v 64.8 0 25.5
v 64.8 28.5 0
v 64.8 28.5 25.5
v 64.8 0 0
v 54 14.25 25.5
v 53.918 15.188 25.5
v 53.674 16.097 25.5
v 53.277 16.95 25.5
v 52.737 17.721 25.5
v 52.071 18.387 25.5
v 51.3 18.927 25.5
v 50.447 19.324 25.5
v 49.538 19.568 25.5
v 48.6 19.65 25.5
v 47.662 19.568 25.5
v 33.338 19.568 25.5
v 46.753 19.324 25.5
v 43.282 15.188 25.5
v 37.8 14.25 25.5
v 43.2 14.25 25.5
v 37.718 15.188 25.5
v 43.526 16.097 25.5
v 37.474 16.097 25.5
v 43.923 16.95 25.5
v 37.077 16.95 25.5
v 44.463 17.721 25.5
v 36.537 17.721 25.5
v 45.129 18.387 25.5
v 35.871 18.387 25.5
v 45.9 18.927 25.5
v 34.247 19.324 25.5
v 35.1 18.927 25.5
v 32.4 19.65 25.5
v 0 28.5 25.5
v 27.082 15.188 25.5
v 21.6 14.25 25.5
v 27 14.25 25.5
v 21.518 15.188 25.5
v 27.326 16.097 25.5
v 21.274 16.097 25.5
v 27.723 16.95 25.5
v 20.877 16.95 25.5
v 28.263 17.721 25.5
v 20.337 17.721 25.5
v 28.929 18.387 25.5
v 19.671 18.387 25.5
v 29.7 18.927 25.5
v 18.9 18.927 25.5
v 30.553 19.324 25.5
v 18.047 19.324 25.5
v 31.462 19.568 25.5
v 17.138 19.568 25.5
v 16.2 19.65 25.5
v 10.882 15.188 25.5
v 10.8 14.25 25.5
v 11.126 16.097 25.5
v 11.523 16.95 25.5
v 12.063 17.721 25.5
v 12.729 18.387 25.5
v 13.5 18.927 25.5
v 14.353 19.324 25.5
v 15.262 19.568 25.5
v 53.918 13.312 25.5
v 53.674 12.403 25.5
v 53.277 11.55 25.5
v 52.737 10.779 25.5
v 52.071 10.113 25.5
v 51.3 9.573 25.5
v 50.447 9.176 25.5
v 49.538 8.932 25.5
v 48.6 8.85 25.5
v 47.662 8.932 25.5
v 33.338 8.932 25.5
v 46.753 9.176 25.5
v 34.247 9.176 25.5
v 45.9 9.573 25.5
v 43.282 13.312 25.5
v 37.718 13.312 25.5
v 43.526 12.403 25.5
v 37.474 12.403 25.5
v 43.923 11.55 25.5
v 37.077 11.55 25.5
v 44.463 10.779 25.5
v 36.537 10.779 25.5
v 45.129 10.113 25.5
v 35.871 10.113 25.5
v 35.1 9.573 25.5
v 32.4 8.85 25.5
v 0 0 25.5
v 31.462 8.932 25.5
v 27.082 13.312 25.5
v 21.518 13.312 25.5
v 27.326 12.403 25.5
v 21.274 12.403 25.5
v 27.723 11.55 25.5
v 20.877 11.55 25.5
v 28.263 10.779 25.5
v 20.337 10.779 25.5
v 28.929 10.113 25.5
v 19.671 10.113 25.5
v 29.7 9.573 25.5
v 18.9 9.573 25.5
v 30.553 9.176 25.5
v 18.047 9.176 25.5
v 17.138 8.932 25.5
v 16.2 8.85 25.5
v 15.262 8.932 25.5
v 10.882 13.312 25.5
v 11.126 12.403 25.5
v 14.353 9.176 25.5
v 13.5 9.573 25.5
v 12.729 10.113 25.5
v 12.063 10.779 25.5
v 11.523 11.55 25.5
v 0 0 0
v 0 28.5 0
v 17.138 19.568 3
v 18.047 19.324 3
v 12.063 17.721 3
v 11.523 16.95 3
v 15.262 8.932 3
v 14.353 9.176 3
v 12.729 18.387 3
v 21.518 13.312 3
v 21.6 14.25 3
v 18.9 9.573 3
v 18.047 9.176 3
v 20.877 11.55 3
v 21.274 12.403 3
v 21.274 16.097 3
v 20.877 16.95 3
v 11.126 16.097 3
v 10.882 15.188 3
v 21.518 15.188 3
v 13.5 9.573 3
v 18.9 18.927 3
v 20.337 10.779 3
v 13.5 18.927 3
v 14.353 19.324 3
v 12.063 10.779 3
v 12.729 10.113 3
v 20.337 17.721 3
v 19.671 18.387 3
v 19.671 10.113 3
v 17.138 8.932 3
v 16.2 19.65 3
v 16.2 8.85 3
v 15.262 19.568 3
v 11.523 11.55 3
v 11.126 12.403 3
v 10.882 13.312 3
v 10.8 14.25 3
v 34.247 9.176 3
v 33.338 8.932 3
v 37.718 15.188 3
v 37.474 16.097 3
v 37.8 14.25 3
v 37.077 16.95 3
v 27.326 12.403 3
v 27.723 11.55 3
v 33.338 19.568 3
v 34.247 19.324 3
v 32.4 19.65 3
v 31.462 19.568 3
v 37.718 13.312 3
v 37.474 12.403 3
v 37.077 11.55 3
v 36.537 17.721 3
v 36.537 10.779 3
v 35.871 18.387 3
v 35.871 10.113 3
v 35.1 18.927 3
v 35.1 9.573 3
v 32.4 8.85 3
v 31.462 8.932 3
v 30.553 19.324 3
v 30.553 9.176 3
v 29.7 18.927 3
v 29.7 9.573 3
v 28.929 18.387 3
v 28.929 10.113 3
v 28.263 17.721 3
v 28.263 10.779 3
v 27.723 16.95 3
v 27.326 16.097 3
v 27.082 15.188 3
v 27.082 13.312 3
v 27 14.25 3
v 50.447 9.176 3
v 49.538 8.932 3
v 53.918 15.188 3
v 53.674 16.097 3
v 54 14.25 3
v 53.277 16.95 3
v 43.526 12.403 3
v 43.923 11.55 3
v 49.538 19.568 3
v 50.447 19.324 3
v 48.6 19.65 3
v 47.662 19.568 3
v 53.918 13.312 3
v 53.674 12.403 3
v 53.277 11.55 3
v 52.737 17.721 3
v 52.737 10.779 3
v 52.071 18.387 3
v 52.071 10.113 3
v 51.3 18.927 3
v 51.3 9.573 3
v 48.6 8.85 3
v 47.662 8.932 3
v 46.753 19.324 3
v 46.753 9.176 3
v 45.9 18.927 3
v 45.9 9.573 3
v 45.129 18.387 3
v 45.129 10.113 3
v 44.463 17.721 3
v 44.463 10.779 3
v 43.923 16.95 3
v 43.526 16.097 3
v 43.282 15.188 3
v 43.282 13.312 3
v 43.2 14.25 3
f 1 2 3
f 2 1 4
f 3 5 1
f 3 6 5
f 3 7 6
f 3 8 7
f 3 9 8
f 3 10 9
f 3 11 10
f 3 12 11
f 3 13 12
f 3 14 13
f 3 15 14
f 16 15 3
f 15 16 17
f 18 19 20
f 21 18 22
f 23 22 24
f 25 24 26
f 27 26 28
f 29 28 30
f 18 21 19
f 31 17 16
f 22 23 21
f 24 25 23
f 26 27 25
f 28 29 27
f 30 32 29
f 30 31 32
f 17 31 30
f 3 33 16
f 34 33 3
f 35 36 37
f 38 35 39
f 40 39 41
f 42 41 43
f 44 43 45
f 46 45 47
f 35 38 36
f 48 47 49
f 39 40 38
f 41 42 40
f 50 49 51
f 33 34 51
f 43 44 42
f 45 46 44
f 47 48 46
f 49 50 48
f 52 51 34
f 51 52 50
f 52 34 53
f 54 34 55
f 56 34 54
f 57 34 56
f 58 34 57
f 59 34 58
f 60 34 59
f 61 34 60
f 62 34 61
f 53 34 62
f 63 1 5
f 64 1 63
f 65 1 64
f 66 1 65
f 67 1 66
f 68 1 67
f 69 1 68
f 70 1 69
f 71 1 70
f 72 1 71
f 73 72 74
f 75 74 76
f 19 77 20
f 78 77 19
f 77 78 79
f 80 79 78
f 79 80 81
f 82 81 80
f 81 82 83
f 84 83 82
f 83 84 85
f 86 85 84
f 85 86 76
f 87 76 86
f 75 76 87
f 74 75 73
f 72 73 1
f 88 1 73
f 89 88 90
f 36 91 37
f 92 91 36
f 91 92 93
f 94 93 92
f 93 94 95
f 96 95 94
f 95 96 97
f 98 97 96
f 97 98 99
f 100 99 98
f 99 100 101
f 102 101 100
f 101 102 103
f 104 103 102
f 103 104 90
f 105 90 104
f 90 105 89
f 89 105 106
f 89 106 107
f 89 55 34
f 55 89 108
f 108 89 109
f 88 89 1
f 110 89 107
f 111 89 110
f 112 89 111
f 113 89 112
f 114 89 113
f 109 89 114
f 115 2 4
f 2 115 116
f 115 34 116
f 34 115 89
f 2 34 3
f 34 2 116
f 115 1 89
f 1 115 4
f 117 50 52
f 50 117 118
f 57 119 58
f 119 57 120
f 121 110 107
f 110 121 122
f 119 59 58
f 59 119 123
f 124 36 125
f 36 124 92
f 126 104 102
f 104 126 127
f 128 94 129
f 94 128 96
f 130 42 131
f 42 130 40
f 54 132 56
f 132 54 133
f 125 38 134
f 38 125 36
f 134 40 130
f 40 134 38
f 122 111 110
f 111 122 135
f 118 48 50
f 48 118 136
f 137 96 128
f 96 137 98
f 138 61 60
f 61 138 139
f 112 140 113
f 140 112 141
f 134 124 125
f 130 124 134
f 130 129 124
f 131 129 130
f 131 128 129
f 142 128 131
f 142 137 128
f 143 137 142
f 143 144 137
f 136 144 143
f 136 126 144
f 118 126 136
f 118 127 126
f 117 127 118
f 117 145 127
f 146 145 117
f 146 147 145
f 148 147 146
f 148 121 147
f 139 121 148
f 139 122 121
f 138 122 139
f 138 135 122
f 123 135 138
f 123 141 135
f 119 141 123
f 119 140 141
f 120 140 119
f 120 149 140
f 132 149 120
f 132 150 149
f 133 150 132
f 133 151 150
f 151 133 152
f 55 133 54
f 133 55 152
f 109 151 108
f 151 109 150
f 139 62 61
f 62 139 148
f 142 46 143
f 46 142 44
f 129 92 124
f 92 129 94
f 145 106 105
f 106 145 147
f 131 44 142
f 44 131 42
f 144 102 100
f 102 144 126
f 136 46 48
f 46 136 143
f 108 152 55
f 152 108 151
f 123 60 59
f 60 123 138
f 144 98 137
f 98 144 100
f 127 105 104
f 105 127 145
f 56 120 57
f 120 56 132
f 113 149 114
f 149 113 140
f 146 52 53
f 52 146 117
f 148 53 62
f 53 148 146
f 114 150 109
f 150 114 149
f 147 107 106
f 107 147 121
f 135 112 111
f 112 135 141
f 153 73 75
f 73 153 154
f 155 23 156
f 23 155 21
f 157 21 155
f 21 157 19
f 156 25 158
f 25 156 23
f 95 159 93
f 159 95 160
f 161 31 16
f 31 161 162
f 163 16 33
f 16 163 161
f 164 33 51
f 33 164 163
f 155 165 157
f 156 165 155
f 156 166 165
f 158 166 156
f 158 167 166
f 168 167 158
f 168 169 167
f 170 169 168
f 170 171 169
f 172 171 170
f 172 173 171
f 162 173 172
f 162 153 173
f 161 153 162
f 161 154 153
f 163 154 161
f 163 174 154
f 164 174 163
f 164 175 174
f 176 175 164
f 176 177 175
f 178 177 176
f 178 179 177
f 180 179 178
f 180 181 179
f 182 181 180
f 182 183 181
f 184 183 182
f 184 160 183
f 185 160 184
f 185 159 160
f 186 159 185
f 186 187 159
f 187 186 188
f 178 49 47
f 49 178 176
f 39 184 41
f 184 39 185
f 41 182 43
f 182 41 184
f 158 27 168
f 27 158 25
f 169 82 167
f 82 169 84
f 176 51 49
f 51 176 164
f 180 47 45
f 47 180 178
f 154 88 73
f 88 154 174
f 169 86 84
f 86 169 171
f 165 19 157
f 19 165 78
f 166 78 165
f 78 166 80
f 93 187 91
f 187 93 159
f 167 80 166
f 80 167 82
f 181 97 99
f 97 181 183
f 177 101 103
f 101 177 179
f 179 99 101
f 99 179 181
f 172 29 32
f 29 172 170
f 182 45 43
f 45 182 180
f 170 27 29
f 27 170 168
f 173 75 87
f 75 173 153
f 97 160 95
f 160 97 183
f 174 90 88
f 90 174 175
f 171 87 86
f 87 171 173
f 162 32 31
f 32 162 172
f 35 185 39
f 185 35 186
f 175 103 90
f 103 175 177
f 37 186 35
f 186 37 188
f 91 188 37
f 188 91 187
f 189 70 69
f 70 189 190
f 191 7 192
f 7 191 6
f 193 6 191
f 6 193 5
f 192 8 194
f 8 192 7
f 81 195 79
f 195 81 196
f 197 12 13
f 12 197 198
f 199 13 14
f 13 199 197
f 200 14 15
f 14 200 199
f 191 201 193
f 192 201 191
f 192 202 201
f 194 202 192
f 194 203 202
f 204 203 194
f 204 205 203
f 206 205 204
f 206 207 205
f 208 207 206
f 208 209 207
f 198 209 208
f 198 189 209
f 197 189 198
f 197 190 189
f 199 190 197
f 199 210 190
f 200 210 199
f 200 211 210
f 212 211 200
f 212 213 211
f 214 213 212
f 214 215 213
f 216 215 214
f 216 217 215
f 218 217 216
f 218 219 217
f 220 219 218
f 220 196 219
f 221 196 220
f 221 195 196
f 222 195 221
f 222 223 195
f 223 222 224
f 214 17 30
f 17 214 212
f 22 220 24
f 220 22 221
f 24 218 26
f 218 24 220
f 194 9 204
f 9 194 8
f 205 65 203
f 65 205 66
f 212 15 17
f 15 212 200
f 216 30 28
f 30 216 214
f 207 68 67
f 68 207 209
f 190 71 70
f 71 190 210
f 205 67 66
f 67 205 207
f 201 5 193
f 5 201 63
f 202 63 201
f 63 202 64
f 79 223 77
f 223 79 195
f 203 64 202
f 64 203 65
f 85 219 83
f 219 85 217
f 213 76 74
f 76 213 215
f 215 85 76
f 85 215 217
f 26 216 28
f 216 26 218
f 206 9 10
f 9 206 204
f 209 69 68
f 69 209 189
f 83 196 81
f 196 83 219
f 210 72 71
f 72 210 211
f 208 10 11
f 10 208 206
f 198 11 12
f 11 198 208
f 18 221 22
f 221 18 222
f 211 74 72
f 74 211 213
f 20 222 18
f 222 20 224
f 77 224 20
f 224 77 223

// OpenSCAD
//Kalligraphiehalter

$fn=36;

h=22.5;
d=10.8;
t=3;

w=d*6;
dp=h+t*2;

difference()
{
    cube([w, dp, h+t]);
    
    translate([w/4,dp/2,t])
    cylinder(h=h, d=d);
    
    translate([w/2,dp/2,t])
    cylinder(h=h, d=d);
    
    translate([w/2+w/4,dp/2,t])
    cylinder(h=h, d=d);
}
